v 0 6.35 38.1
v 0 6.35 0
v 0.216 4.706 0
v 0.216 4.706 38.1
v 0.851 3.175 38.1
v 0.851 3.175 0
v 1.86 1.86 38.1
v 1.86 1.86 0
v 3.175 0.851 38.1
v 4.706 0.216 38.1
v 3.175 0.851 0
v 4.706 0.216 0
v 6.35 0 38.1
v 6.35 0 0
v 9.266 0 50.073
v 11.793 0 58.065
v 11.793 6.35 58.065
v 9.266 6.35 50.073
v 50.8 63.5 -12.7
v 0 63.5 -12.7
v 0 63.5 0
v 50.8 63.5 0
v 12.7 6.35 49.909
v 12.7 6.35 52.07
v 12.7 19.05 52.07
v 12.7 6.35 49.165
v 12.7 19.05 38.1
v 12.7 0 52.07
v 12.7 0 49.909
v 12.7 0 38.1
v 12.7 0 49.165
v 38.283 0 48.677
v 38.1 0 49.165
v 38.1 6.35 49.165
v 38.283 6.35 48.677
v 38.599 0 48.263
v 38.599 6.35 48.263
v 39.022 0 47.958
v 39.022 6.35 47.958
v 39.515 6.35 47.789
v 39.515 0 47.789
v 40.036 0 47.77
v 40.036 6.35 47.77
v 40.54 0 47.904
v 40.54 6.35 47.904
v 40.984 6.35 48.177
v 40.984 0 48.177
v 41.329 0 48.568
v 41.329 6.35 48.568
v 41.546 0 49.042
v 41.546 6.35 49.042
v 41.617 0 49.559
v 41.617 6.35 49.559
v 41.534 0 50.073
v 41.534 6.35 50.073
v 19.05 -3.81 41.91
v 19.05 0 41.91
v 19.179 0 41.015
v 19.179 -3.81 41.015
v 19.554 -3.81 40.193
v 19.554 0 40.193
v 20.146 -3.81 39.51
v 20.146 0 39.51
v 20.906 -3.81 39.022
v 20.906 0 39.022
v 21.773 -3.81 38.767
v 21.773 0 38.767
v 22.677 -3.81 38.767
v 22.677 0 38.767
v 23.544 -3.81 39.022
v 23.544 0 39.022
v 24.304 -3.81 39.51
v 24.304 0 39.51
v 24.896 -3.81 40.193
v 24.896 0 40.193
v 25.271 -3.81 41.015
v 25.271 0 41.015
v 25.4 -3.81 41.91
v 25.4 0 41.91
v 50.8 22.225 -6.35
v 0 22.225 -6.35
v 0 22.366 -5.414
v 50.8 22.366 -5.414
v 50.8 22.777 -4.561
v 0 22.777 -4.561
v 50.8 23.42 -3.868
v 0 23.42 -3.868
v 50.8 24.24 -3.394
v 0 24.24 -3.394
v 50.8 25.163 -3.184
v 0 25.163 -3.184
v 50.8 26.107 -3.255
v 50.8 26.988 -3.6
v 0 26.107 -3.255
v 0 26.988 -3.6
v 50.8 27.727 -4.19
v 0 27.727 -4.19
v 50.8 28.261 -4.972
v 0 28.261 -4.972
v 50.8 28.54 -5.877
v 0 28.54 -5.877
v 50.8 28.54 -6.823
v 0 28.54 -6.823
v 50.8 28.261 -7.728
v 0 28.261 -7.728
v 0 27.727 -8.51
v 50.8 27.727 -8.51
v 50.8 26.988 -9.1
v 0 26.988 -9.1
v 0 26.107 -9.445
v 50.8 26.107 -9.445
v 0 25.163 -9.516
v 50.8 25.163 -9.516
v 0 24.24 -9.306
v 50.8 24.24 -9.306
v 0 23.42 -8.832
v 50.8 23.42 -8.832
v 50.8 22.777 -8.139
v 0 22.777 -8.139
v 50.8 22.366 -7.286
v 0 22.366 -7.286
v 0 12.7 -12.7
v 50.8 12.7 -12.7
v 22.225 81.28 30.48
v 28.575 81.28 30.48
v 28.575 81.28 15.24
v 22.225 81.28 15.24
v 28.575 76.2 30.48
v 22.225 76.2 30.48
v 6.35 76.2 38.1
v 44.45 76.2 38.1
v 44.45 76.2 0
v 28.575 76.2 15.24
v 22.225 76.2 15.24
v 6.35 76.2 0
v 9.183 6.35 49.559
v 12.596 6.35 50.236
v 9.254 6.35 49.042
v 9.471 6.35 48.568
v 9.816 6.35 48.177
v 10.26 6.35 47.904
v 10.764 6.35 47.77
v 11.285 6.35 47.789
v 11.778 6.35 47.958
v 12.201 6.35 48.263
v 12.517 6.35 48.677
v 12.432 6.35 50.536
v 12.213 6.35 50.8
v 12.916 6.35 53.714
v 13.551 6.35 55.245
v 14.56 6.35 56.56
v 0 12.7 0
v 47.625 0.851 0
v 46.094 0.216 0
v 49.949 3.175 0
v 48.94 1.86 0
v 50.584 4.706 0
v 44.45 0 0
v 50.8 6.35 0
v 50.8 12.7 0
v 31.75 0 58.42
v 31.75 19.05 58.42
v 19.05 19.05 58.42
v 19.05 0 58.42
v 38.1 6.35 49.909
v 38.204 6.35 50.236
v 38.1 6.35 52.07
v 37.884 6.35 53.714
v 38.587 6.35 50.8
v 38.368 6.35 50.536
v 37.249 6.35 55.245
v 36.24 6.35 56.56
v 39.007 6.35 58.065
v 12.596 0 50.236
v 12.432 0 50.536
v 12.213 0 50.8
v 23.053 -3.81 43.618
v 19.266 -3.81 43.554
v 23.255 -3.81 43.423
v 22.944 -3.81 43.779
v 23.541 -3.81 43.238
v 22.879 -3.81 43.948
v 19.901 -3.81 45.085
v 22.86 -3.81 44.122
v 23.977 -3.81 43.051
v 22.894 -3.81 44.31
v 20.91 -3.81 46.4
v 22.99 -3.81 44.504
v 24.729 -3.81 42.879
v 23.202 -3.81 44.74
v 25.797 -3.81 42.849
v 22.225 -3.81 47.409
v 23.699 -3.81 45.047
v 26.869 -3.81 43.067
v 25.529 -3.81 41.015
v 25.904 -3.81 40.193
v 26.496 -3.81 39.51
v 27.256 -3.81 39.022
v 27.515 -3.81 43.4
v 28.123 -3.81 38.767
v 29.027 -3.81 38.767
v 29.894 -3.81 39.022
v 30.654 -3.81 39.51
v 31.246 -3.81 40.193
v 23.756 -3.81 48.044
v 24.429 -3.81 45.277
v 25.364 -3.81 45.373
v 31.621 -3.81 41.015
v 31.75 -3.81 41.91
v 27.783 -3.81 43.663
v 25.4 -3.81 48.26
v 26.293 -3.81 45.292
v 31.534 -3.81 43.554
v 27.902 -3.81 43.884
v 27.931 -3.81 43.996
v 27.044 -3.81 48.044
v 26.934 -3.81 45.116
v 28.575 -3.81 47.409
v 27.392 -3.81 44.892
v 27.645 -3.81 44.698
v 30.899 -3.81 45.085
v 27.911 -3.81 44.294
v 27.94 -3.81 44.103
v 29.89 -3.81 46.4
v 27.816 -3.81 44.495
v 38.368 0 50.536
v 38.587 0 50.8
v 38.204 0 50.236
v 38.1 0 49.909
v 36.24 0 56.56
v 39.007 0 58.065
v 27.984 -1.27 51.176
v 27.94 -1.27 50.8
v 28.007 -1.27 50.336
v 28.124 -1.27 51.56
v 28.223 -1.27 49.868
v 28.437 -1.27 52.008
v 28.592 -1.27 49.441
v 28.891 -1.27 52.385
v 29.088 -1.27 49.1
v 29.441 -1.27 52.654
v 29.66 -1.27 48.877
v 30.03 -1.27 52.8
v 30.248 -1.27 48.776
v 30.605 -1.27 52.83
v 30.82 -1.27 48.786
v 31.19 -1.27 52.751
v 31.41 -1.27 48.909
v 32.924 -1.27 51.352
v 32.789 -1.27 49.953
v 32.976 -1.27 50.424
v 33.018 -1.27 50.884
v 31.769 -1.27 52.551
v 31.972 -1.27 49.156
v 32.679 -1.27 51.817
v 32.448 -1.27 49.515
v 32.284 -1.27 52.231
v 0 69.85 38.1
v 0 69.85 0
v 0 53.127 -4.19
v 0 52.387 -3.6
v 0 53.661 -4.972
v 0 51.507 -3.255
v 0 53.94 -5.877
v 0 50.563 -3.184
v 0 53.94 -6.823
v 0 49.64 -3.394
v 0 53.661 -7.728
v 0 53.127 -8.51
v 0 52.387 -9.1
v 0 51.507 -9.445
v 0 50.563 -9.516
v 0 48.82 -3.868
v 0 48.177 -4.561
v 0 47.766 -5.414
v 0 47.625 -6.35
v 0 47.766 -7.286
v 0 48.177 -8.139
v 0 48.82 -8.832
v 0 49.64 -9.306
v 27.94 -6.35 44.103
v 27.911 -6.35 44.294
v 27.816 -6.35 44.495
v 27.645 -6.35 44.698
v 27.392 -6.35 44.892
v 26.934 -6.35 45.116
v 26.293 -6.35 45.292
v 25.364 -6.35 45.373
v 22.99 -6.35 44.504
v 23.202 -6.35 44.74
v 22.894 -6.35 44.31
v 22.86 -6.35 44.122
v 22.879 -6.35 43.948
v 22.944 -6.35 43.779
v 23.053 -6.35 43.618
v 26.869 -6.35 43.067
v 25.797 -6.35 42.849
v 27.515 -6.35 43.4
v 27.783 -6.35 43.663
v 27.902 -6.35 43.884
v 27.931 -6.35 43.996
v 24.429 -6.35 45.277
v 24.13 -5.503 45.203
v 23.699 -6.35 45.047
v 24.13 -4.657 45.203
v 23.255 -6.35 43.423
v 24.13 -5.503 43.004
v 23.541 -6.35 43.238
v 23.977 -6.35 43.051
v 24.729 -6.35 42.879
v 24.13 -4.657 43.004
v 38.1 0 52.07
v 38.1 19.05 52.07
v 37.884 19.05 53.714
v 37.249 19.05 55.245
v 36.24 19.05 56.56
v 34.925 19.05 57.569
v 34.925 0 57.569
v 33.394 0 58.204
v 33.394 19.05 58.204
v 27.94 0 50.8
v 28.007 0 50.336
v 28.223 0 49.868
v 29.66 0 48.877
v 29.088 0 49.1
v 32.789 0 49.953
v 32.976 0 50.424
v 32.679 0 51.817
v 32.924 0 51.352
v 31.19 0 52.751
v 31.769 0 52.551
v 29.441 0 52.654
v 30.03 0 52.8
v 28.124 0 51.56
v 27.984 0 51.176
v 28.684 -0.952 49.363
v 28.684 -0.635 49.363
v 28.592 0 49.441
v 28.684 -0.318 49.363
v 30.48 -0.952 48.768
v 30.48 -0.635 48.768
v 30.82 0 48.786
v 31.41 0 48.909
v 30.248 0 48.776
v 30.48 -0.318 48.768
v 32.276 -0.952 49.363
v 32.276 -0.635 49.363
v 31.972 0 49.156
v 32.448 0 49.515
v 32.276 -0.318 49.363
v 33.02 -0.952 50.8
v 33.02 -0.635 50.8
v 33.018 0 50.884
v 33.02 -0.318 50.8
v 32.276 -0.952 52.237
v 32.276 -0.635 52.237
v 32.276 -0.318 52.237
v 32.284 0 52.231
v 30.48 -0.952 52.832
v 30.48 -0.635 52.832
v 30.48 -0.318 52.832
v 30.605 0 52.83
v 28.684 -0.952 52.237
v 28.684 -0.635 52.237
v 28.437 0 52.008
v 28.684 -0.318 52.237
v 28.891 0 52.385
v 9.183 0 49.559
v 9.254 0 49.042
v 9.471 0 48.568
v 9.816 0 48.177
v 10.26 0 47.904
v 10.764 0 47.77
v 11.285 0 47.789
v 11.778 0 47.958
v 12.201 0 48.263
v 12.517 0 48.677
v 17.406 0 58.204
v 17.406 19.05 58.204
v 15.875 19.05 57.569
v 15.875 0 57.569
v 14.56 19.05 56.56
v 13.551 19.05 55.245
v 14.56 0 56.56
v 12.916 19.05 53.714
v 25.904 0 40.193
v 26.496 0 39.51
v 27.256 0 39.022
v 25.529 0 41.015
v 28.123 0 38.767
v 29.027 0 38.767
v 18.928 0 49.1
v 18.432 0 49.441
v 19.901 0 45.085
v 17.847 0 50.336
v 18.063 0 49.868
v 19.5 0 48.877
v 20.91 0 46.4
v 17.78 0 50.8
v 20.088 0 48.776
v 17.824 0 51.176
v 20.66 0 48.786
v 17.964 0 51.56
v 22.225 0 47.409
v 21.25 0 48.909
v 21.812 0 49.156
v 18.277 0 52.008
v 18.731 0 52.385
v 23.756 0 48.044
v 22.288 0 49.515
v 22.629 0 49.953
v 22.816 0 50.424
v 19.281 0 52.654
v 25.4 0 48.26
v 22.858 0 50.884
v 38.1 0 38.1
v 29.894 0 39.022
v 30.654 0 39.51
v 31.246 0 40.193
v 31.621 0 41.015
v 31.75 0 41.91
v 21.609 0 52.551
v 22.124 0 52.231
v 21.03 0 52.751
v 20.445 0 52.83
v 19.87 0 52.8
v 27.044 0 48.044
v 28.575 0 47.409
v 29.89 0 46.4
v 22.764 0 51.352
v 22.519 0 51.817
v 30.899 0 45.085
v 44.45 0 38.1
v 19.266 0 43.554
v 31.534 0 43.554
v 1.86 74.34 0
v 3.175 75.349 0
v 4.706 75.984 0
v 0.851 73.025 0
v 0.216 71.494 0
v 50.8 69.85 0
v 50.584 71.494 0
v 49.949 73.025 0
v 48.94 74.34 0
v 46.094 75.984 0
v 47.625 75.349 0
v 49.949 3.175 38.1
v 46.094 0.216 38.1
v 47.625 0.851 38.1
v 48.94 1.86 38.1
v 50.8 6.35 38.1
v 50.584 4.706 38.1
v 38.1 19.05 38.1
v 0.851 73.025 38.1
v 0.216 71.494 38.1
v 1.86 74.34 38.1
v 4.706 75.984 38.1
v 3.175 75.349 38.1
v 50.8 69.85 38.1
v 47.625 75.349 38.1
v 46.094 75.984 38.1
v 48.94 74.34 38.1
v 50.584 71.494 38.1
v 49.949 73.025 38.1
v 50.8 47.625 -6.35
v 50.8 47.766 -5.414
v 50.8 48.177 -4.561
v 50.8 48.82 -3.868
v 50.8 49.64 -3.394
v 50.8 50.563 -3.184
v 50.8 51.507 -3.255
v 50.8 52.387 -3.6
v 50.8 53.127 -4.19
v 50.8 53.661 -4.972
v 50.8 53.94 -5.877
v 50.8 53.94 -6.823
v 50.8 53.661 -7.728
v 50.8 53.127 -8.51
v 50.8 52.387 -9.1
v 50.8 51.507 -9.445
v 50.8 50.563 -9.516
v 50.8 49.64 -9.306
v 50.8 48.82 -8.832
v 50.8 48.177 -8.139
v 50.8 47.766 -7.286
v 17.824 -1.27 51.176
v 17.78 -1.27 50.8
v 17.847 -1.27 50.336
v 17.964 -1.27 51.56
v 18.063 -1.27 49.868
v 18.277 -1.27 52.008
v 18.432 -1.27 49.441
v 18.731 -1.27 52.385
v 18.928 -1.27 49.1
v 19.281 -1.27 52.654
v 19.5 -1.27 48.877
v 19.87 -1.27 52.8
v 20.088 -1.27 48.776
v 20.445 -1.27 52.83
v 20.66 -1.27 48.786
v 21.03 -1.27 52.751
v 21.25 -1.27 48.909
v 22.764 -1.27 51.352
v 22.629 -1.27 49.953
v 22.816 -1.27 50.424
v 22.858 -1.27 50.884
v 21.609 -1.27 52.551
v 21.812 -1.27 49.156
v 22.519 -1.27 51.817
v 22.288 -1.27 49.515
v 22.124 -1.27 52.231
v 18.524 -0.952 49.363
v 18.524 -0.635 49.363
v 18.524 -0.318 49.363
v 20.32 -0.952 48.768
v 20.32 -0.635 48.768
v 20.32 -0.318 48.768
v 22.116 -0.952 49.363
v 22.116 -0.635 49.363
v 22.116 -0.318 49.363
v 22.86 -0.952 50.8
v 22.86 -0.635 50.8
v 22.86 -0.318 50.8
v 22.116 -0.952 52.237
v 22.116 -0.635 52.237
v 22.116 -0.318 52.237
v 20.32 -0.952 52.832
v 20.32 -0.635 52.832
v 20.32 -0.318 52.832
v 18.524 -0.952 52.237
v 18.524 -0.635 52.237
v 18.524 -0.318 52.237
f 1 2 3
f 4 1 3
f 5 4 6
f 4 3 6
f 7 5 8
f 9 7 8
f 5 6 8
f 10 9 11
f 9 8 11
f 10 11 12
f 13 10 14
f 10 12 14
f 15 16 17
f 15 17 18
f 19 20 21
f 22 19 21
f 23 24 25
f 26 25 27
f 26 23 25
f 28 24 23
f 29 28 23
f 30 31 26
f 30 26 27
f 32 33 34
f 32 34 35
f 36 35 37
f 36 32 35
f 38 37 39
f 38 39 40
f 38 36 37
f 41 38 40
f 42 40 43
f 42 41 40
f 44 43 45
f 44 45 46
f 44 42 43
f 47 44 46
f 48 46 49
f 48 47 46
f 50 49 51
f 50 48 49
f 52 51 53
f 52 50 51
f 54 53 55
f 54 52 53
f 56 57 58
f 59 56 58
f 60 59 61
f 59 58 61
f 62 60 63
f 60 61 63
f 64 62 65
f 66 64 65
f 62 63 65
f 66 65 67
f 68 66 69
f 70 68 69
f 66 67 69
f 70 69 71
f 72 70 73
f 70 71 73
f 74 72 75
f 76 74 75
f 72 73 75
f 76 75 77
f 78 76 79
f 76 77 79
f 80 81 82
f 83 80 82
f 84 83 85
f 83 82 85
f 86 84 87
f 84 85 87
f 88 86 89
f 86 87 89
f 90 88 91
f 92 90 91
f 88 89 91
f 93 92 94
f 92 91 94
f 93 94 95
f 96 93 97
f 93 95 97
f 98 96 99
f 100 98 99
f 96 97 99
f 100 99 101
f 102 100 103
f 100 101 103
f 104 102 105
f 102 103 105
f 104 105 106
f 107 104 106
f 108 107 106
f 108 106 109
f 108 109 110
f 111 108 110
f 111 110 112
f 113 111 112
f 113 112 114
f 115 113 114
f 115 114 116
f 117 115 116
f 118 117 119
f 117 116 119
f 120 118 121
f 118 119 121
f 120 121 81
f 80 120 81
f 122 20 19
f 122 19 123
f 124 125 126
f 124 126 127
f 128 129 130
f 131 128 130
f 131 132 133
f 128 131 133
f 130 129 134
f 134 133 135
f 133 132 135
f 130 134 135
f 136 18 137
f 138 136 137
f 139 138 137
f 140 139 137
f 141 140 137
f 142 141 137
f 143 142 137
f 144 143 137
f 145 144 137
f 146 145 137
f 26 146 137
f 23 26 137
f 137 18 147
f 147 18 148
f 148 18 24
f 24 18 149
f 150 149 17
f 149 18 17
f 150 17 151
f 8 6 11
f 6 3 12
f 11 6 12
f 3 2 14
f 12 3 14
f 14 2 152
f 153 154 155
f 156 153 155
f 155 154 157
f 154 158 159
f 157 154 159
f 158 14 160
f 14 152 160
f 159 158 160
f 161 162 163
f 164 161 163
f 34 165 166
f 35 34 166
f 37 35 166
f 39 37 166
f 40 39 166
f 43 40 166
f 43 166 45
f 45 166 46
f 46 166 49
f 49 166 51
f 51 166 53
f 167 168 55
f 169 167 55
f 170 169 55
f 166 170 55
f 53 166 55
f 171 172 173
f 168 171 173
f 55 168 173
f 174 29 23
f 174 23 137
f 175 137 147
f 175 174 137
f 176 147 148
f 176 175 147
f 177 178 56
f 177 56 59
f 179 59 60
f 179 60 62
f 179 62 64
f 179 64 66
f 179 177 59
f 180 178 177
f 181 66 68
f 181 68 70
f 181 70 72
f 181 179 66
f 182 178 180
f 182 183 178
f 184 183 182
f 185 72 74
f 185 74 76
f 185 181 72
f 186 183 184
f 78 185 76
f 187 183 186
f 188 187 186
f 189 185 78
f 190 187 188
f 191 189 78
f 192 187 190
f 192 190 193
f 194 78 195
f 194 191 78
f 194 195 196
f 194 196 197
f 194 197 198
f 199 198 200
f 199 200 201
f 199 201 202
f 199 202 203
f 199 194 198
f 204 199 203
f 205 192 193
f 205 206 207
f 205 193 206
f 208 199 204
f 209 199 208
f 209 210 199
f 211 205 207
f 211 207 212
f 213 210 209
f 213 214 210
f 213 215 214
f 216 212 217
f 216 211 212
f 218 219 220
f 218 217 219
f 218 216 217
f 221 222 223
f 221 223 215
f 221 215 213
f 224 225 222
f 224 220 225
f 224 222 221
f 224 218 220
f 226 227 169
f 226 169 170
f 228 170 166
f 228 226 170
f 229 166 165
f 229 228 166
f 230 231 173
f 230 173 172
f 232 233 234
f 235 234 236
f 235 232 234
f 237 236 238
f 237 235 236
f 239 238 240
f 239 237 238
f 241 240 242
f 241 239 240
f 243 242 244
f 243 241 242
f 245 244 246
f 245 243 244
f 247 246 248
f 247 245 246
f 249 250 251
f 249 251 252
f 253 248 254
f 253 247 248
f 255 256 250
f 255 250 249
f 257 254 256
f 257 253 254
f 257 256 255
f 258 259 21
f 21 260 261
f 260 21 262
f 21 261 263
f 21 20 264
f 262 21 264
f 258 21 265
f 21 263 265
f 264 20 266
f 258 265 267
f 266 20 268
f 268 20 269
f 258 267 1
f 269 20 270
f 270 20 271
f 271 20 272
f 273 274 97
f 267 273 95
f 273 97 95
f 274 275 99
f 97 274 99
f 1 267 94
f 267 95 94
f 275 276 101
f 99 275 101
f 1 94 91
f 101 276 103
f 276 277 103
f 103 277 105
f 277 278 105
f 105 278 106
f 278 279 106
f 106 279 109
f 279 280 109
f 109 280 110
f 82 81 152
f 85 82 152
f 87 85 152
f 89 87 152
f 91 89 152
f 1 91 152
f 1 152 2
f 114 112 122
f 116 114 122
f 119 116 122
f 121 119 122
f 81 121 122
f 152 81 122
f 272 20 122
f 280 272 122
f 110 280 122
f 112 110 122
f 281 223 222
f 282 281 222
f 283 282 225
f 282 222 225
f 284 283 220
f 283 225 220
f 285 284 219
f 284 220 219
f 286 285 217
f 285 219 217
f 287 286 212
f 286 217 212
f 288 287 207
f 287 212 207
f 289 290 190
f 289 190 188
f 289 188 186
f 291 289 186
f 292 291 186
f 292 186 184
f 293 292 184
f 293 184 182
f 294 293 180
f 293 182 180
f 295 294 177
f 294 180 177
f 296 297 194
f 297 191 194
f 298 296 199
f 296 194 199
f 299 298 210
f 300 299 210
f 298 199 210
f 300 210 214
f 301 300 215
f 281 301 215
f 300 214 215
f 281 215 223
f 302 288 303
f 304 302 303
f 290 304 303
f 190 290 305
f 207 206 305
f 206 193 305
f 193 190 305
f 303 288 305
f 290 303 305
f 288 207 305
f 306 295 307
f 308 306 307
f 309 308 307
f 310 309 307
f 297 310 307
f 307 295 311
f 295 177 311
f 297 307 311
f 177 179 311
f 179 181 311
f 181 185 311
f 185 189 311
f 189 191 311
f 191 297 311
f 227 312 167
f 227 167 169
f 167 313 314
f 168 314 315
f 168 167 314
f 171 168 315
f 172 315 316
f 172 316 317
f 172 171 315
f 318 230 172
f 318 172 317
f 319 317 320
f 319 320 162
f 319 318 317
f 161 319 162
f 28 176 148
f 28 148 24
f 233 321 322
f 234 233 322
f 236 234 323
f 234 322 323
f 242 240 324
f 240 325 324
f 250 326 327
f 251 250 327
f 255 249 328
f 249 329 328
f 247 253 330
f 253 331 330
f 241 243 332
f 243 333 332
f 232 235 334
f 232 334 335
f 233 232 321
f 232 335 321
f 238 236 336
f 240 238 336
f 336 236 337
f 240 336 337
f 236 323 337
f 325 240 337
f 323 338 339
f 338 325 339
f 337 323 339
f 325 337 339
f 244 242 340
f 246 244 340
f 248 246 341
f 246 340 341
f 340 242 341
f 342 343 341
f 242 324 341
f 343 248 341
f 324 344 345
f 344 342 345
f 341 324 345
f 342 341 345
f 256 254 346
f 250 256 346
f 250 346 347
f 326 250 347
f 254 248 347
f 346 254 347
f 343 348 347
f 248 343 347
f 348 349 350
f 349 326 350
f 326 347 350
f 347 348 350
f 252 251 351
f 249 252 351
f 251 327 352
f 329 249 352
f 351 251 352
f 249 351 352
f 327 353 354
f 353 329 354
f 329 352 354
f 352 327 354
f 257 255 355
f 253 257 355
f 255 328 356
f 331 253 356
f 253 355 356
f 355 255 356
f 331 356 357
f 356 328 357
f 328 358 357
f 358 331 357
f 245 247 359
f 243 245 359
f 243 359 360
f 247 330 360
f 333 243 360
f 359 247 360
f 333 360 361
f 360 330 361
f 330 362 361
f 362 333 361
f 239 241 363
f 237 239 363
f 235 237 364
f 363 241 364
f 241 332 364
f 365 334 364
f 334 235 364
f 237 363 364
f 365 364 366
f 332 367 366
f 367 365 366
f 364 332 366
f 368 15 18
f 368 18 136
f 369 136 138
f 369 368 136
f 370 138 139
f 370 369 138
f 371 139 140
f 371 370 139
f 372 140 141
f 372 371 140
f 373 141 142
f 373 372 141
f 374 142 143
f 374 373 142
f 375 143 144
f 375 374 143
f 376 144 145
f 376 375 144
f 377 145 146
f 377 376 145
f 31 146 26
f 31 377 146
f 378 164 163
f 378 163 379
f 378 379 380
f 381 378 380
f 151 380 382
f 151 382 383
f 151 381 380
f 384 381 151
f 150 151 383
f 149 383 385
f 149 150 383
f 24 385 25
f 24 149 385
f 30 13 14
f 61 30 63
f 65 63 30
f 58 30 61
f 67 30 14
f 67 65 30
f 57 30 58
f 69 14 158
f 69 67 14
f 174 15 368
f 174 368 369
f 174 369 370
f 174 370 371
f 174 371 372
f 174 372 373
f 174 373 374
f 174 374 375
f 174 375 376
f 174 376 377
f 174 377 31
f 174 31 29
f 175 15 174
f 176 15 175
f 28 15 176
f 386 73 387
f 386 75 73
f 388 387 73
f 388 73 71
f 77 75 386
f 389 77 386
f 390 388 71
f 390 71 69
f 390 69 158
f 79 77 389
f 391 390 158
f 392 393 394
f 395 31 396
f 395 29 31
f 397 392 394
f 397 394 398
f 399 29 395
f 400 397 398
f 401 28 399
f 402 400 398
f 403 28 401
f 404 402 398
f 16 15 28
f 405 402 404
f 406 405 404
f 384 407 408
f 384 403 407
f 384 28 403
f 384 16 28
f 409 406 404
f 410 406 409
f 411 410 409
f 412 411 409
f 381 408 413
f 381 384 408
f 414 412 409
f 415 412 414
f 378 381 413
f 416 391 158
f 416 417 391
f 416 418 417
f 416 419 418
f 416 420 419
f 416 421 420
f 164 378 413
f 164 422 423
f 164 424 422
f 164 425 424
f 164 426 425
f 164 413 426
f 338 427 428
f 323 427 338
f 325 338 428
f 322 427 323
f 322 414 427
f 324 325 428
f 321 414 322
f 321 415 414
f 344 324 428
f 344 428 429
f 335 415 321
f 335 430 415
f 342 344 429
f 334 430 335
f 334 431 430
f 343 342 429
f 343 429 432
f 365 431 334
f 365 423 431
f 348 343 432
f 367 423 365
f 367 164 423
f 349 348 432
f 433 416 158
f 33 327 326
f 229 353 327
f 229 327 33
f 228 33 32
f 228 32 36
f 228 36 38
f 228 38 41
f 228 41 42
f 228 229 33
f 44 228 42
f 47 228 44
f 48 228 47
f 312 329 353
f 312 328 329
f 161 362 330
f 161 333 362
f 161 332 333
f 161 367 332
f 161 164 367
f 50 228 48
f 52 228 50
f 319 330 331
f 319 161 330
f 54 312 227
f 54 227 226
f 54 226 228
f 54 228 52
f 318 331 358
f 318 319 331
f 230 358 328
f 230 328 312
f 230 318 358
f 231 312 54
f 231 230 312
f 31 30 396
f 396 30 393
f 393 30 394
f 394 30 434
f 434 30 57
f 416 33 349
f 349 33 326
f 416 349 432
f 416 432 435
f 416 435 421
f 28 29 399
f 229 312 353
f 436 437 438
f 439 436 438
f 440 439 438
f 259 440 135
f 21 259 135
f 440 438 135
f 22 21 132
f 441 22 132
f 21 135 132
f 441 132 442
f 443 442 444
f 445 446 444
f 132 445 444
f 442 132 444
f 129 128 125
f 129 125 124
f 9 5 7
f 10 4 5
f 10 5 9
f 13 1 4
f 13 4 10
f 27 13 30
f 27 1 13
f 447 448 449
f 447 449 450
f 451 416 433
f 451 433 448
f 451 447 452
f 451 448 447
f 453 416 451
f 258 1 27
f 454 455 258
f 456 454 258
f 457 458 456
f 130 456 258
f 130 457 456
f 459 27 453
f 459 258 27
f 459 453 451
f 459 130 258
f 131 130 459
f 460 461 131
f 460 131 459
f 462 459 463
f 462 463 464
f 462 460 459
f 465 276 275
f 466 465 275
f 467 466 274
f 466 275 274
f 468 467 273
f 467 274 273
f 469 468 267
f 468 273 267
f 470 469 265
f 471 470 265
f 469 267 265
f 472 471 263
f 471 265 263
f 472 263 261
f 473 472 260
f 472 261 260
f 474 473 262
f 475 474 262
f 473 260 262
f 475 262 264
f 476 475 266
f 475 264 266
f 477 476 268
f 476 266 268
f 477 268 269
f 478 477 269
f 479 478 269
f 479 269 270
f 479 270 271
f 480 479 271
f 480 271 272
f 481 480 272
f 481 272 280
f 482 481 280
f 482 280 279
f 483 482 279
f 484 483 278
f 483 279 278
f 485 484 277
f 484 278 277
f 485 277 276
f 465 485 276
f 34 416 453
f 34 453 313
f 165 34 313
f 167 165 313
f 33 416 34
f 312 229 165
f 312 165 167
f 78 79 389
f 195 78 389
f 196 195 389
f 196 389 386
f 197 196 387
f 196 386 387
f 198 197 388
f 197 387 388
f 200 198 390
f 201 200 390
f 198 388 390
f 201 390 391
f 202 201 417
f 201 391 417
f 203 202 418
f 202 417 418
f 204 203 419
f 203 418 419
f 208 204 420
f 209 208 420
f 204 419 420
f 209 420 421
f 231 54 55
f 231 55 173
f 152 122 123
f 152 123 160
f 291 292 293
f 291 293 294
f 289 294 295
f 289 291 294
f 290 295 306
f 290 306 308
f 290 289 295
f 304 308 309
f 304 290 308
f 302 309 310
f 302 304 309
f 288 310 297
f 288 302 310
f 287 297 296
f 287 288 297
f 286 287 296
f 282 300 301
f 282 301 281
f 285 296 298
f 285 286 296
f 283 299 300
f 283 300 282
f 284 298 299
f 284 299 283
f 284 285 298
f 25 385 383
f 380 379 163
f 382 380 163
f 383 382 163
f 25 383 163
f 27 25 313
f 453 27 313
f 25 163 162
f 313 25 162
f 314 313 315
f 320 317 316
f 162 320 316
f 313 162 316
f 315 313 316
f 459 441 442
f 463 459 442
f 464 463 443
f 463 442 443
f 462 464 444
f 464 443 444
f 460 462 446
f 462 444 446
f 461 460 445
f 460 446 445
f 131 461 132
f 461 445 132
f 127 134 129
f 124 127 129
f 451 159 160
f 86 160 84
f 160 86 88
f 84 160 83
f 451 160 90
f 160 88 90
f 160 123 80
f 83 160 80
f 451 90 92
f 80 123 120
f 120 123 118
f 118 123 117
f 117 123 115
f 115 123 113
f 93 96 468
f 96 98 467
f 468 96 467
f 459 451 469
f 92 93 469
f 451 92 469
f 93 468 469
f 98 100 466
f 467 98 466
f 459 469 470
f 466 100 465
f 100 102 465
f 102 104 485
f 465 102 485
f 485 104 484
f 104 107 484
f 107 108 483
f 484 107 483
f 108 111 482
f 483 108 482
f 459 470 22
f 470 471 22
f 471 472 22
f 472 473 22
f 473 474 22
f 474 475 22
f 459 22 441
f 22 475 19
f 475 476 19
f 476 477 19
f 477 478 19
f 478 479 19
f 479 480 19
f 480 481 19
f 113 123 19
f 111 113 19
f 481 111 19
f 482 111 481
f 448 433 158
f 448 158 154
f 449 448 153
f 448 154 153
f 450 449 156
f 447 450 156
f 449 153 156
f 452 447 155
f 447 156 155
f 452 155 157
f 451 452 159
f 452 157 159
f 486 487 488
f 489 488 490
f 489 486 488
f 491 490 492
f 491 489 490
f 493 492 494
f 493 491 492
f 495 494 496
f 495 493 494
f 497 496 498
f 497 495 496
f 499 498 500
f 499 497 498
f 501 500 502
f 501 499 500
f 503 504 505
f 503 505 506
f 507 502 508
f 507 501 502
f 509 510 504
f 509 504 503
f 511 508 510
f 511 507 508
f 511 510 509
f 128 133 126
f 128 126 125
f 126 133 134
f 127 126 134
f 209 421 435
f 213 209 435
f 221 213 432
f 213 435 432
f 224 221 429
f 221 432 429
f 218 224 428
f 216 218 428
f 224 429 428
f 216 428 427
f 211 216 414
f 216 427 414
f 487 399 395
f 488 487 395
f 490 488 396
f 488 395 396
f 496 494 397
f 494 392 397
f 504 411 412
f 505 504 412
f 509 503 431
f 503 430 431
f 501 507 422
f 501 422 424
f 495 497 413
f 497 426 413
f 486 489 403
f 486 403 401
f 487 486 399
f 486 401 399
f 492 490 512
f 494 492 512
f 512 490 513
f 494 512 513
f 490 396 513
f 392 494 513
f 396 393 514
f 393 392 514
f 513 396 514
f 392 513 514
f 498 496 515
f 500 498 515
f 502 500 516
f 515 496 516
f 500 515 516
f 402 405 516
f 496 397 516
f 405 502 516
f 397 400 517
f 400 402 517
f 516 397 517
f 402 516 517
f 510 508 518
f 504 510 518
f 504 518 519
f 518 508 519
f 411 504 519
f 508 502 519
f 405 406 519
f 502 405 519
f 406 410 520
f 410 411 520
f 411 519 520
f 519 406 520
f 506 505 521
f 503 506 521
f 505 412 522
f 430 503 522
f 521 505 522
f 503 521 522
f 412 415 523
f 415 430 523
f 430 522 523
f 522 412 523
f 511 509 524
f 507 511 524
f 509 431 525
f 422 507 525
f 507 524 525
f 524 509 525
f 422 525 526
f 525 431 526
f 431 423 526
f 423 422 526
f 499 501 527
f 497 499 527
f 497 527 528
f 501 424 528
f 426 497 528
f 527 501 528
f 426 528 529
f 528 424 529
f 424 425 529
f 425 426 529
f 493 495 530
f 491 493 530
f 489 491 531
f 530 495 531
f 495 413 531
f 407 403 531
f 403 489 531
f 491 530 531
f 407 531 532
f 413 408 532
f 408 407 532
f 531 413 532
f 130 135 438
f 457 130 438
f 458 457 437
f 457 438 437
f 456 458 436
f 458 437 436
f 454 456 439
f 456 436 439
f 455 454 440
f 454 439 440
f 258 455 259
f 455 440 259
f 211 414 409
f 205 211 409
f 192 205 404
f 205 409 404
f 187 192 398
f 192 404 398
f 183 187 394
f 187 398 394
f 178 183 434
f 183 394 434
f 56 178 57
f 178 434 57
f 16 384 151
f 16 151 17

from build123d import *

# Parameters (mm, degrees)
F1_DEPTH  = 38.1
F3_W      = 50.8
F3_H      = 12.7
F3_R      = 3.175
F4_DEPTH  = 50.8
F6_DEPTH  = 19.05
F7_DEPTH  = 3.81
F9_DEPTH  = 2.54
F11_DEPTH = 6.35
F12_DEPTH = 1.27
F13_W     = 6.35
F13_H     = 15.24
F14_DEPTH = 5.08


with BuildPart() as f1:
    # F0 (on Top) → F1 (new body)
    with BuildSketch(Plane.XY):
        with BuildLine():
            Line((0, 69.85), (0, 6.35))
            ThreePointArc((0, 6.35), (1.8598719395, 1.8598719395), (6.35, 0))
            Line((6.35, 0), (44.45, 0))
            ThreePointArc((44.45, 0), (48.9401280605, 1.8598719395), (50.8, 6.35))
            Line((50.8, 6.35), (50.8, 69.85))
            ThreePointArc((50.8, 69.85), (48.9401280605, 74.3401280605), (44.45, 76.2))
            Line((44.45, 76.2), (6.35, 76.2))
            ThreePointArc((6.35, 76.2), (1.8598719395, 74.3401280605), (0, 69.85))
        make_face()
    extrude(amount=F1_DEPTH)

    # F3 (on face) → F4 (join, through all)
    with BuildSketch(Plane(origin=(0, 0, 0), x_dir=(0, -1, 0), z_dir=(-1, 0, 0))):
        with Locations((-38.1, -6.35)):
            Rectangle(F3_W, F3_H)
        with Locations((-50.8, -6.35)):
            Circle(F3_R, mode=Mode.SUBTRACT)
        with Locations((-25.4, -6.35)):
            Circle(F3_R, mode=Mode.SUBTRACT)
    extrude(amount=-F4_DEPTH)

    # F5 (on face) → F6 (join)
    with BuildSketch(Plane.XZ):
        with BuildLine():
            Line((12.7, 52.07), (12.7, 38.1))
            Line((12.7, 38.1), (38.1, 38.1))
            Line((38.1, 38.1), (38.1, 52.07))
            ThreePointArc((38.1, 52.07), (36.2401280605, 56.5601280605), (31.75, 58.42))
            Line((31.75, 58.42), (19.05, 58.42))
            ThreePointArc((19.05, 58.42), (14.5598719395, 56.5601280605), (12.7, 52.07))
        make_face()
        with BuildLine():
            ThreePointArc((19.05, 41.91), (20.9098719395, 46.4001280605), (25.4, 48.26))
            ThreePointArc((25.4, 48.26), (29.8901280605, 46.4001280605), (31.75, 41.91))
            ThreePointArc((31.75, 41.91), (28.575, 38.735), (25.4, 41.91))
            ThreePointArc((25.4, 41.91), (22.225, 38.735), (19.05, 41.91))
        make_face(mode=Mode.SUBTRACT)
        with BuildLine():
            ThreePointArc((31.75, 41.91), (29.8901280605, 46.4001280605), (25.4, 48.26))
            ThreePointArc((25.4, 48.26), (20.9098719395, 46.4001280605), (19.05, 41.91))
            ThreePointArc((19.05, 41.91), (22.225, 38.735), (25.4, 41.91))
            ThreePointArc((25.4, 41.91), (28.575, 38.735), (31.75, 41.91))
        make_face()
    extrude(amount=-F6_DEPTH)

    # F5 (on face) → F7 (join)
    with BuildSketch(Plane.XZ):
        with BuildLine():
            ThreePointArc((31.75, 41.91), (29.8901280605, 46.4001280605), (25.4, 48.26))
            ThreePointArc((25.4, 48.26), (20.9098719395, 46.4001280605), (19.05, 41.91))
            ThreePointArc((19.05, 41.91), (22.225, 38.735), (25.4, 41.91))
            ThreePointArc((25.4, 41.91), (28.575, 38.735), (31.75, 41.91))
        make_face()
    extrude(amount=F7_DEPTH)

    # F8 (on face) → F9 (join)
    with BuildSketch(Plane.XZ.offset(3.81)):
        with BuildLine():
            add(Edge.make_bspline(
                [(27.94, 44.1034744838), (27.94, 46.3031790094), (24.13, 45.2033267466), (20.32, 44.1034744838), (24.13, 43.003622221), (27.94, 41.9037699582), (27.94, 44.1034744838)],
                knots=[0, 0, 0, 2.0943951024, 2.0943951024, 4.1887902048, 4.1887902048, 6.2831853072, 6.2831853072, 6.2831853072], degree=2, weights=[1, 0.5, 1, 0.5, 1, 0.5, 1]))
        make_face()
    extrude(amount=F9_DEPTH)

    # F10 (on face) → F11 (join)
    with BuildSketch(Plane.XZ):
        with BuildLine():
            Line((17.78, 50.8), (22.86, 50.8))
            add(Edge.make_bspline(
                [(22.86, 50.8), (22.86, 52.832), (20.32, 52.832), (17.78, 52.832), (17.78, 50.8)],
                knots=[0, 0, 0, 1.5707963268, 1.5707963268, 3.1415926536, 3.1415926536, 3.1415926536], degree=2, weights=[1, 0.7071067812, 1, 0.7071067812, 1]))
        make_face()
        with BuildLine():
            add(Edge.make_bspline(
                [(17.78, 50.8), (17.78, 48.768), (20.32, 48.768), (22.86, 48.768), (22.86, 50.8)],
                knots=[3.1415926536, 3.1415926536, 3.1415926536, 4.7123889804, 4.7123889804, 6.2831853072, 6.2831853072, 6.2831853072], degree=2, weights=[1, 0.7071067812, 1, 0.7071067812, 1]))
            Line((22.86, 50.8), (17.78, 50.8))
        make_face()
        with BuildLine():
            add(Edge.make_bspline(
                [(27.94, 50.8), (27.94, 48.768), (30.48, 48.768), (33.02, 48.768), (33.02, 50.8)],
                knots=[3.1415926536, 3.1415926536, 3.1415926536, 4.7123889804, 4.7123889804, 6.2831853072, 6.2831853072, 6.2831853072], degree=2, weights=[1, 0.7071067812, 1, 0.7071067812, 1]))
            Line((33.02, 50.8), (27.94, 50.8))
        make_face()
        with BuildLine():
            Line((27.94, 50.8), (33.02, 50.8))
            add(Edge.make_bspline(
                [(33.02, 50.8), (33.02, 52.832), (30.48, 52.832), (27.94, 52.832), (27.94, 50.8)],
                knots=[0, 0, 0, 1.5707963268, 1.5707963268, 3.1415926536, 3.1415926536, 3.1415926536], degree=2, weights=[1, 0.7071067812, 1, 0.7071067812, 1]))
        make_face()
        with BuildLine():
            ThreePointArc((36.2401280605, 56.5601280605), (37.6166350314, 54.5000397955), (38.1, 52.07))
            Line((38.1, 52.07), (38.5869643704, 50.8))
            ThreePointArc((38.5869643704, 50.8), (38.2785524575, 50.3900976738), (38.1, 49.9092059552))
            Line((38.1, 49.9092059552), (38.1, 49.1652853166))
            ThreePointArc((38.1, 49.1652853166), (40.2931830208, 47.8183243314), (41.5339241122, 50.0733004294))
            Line((41.5339241122, 50.0733004294), (39.0068086574, 58.0652721184))
            Line((39.0068086574, 58.0652721184), (36.2401280605, 56.5601280605))
        make_face()
        with BuildLine():
            Line((12.2130356296, 50.8), (12.7, 52.07))
            ThreePointArc((12.7, 52.07), (13.1833649686, 54.5000397955), (14.5598719395, 56.5601280605))
            Line((14.5598719395, 56.5601280605), (11.7931913426, 58.0652721184))
            Line((11.7931913426, 58.0652721184), (9.2660758878, 50.0733004294))
            ThreePointArc((9.2660758878, 50.0733004294), (10.5068169792, 47.8183243314), (12.7, 49.1652853166))
            Line((12.7, 49.1652853166), (12.7, 49.9092059552))
            ThreePointArc((12.7, 49.9092059552), (12.5214475425, 50.3900976738), (12.2130356296, 50.8))
        make_face()
    extrude(amount=-F11_DEPTH)

    # F10 (on face) → F12 (join)
    with BuildSketch(Plane.XZ):
        with BuildLine():
            Line((17.78, 50.8), (22.86, 50.8))
            add(Edge.make_bspline(
                [(22.86, 50.8), (22.86, 52.832), (20.32, 52.832), (17.78, 52.832), (17.78, 50.8)],
                knots=[0, 0, 0, 1.5707963268, 1.5707963268, 3.1415926536, 3.1415926536, 3.1415926536], degree=2, weights=[1, 0.7071067812, 1, 0.7071067812, 1]))
        make_face()
        with BuildLine():
            add(Edge.make_bspline(
                [(17.78, 50.8), (17.78, 48.768), (20.32, 48.768), (22.86, 48.768), (22.86, 50.8)],
                knots=[3.1415926536, 3.1415926536, 3.1415926536, 4.7123889804, 4.7123889804, 6.2831853072, 6.2831853072, 6.2831853072], degree=2, weights=[1, 0.7071067812, 1, 0.7071067812, 1]))
            Line((22.86, 50.8), (17.78, 50.8))
        make_face()
        with BuildLine():
            Line((27.94, 50.8), (33.02, 50.8))
            add(Edge.make_bspline(
                [(33.02, 50.8), (33.02, 52.832), (30.48, 52.832), (27.94, 52.832), (27.94, 50.8)],
                knots=[0, 0, 0, 1.5707963268, 1.5707963268, 3.1415926536, 3.1415926536, 3.1415926536], degree=2, weights=[1, 0.7071067812, 1, 0.7071067812, 1]))
        make_face()
        with BuildLine():
            add(Edge.make_bspline(
                [(27.94, 50.8), (27.94, 48.768), (30.48, 48.768), (33.02, 48.768), (33.02, 50.8)],
                knots=[3.1415926536, 3.1415926536, 3.1415926536, 4.7123889804, 4.7123889804, 6.2831853072, 6.2831853072, 6.2831853072], degree=2, weights=[1, 0.7071067812, 1, 0.7071067812, 1]))
            Line((33.02, 50.8), (27.94, 50.8))
        make_face()
    extrude(amount=F12_DEPTH)

    # F13 (on face) → F14 (join)
    with BuildSketch(Plane(origin=(0, 76.2, 0), x_dir=(-1, 0, 0), z_dir=(0, 1, 0))):
        with Locations((-25.4, 22.86)):
            Rectangle(F13_W, F13_H)
    extrude(amount=F14_DEPTH)


solid = f1.part
